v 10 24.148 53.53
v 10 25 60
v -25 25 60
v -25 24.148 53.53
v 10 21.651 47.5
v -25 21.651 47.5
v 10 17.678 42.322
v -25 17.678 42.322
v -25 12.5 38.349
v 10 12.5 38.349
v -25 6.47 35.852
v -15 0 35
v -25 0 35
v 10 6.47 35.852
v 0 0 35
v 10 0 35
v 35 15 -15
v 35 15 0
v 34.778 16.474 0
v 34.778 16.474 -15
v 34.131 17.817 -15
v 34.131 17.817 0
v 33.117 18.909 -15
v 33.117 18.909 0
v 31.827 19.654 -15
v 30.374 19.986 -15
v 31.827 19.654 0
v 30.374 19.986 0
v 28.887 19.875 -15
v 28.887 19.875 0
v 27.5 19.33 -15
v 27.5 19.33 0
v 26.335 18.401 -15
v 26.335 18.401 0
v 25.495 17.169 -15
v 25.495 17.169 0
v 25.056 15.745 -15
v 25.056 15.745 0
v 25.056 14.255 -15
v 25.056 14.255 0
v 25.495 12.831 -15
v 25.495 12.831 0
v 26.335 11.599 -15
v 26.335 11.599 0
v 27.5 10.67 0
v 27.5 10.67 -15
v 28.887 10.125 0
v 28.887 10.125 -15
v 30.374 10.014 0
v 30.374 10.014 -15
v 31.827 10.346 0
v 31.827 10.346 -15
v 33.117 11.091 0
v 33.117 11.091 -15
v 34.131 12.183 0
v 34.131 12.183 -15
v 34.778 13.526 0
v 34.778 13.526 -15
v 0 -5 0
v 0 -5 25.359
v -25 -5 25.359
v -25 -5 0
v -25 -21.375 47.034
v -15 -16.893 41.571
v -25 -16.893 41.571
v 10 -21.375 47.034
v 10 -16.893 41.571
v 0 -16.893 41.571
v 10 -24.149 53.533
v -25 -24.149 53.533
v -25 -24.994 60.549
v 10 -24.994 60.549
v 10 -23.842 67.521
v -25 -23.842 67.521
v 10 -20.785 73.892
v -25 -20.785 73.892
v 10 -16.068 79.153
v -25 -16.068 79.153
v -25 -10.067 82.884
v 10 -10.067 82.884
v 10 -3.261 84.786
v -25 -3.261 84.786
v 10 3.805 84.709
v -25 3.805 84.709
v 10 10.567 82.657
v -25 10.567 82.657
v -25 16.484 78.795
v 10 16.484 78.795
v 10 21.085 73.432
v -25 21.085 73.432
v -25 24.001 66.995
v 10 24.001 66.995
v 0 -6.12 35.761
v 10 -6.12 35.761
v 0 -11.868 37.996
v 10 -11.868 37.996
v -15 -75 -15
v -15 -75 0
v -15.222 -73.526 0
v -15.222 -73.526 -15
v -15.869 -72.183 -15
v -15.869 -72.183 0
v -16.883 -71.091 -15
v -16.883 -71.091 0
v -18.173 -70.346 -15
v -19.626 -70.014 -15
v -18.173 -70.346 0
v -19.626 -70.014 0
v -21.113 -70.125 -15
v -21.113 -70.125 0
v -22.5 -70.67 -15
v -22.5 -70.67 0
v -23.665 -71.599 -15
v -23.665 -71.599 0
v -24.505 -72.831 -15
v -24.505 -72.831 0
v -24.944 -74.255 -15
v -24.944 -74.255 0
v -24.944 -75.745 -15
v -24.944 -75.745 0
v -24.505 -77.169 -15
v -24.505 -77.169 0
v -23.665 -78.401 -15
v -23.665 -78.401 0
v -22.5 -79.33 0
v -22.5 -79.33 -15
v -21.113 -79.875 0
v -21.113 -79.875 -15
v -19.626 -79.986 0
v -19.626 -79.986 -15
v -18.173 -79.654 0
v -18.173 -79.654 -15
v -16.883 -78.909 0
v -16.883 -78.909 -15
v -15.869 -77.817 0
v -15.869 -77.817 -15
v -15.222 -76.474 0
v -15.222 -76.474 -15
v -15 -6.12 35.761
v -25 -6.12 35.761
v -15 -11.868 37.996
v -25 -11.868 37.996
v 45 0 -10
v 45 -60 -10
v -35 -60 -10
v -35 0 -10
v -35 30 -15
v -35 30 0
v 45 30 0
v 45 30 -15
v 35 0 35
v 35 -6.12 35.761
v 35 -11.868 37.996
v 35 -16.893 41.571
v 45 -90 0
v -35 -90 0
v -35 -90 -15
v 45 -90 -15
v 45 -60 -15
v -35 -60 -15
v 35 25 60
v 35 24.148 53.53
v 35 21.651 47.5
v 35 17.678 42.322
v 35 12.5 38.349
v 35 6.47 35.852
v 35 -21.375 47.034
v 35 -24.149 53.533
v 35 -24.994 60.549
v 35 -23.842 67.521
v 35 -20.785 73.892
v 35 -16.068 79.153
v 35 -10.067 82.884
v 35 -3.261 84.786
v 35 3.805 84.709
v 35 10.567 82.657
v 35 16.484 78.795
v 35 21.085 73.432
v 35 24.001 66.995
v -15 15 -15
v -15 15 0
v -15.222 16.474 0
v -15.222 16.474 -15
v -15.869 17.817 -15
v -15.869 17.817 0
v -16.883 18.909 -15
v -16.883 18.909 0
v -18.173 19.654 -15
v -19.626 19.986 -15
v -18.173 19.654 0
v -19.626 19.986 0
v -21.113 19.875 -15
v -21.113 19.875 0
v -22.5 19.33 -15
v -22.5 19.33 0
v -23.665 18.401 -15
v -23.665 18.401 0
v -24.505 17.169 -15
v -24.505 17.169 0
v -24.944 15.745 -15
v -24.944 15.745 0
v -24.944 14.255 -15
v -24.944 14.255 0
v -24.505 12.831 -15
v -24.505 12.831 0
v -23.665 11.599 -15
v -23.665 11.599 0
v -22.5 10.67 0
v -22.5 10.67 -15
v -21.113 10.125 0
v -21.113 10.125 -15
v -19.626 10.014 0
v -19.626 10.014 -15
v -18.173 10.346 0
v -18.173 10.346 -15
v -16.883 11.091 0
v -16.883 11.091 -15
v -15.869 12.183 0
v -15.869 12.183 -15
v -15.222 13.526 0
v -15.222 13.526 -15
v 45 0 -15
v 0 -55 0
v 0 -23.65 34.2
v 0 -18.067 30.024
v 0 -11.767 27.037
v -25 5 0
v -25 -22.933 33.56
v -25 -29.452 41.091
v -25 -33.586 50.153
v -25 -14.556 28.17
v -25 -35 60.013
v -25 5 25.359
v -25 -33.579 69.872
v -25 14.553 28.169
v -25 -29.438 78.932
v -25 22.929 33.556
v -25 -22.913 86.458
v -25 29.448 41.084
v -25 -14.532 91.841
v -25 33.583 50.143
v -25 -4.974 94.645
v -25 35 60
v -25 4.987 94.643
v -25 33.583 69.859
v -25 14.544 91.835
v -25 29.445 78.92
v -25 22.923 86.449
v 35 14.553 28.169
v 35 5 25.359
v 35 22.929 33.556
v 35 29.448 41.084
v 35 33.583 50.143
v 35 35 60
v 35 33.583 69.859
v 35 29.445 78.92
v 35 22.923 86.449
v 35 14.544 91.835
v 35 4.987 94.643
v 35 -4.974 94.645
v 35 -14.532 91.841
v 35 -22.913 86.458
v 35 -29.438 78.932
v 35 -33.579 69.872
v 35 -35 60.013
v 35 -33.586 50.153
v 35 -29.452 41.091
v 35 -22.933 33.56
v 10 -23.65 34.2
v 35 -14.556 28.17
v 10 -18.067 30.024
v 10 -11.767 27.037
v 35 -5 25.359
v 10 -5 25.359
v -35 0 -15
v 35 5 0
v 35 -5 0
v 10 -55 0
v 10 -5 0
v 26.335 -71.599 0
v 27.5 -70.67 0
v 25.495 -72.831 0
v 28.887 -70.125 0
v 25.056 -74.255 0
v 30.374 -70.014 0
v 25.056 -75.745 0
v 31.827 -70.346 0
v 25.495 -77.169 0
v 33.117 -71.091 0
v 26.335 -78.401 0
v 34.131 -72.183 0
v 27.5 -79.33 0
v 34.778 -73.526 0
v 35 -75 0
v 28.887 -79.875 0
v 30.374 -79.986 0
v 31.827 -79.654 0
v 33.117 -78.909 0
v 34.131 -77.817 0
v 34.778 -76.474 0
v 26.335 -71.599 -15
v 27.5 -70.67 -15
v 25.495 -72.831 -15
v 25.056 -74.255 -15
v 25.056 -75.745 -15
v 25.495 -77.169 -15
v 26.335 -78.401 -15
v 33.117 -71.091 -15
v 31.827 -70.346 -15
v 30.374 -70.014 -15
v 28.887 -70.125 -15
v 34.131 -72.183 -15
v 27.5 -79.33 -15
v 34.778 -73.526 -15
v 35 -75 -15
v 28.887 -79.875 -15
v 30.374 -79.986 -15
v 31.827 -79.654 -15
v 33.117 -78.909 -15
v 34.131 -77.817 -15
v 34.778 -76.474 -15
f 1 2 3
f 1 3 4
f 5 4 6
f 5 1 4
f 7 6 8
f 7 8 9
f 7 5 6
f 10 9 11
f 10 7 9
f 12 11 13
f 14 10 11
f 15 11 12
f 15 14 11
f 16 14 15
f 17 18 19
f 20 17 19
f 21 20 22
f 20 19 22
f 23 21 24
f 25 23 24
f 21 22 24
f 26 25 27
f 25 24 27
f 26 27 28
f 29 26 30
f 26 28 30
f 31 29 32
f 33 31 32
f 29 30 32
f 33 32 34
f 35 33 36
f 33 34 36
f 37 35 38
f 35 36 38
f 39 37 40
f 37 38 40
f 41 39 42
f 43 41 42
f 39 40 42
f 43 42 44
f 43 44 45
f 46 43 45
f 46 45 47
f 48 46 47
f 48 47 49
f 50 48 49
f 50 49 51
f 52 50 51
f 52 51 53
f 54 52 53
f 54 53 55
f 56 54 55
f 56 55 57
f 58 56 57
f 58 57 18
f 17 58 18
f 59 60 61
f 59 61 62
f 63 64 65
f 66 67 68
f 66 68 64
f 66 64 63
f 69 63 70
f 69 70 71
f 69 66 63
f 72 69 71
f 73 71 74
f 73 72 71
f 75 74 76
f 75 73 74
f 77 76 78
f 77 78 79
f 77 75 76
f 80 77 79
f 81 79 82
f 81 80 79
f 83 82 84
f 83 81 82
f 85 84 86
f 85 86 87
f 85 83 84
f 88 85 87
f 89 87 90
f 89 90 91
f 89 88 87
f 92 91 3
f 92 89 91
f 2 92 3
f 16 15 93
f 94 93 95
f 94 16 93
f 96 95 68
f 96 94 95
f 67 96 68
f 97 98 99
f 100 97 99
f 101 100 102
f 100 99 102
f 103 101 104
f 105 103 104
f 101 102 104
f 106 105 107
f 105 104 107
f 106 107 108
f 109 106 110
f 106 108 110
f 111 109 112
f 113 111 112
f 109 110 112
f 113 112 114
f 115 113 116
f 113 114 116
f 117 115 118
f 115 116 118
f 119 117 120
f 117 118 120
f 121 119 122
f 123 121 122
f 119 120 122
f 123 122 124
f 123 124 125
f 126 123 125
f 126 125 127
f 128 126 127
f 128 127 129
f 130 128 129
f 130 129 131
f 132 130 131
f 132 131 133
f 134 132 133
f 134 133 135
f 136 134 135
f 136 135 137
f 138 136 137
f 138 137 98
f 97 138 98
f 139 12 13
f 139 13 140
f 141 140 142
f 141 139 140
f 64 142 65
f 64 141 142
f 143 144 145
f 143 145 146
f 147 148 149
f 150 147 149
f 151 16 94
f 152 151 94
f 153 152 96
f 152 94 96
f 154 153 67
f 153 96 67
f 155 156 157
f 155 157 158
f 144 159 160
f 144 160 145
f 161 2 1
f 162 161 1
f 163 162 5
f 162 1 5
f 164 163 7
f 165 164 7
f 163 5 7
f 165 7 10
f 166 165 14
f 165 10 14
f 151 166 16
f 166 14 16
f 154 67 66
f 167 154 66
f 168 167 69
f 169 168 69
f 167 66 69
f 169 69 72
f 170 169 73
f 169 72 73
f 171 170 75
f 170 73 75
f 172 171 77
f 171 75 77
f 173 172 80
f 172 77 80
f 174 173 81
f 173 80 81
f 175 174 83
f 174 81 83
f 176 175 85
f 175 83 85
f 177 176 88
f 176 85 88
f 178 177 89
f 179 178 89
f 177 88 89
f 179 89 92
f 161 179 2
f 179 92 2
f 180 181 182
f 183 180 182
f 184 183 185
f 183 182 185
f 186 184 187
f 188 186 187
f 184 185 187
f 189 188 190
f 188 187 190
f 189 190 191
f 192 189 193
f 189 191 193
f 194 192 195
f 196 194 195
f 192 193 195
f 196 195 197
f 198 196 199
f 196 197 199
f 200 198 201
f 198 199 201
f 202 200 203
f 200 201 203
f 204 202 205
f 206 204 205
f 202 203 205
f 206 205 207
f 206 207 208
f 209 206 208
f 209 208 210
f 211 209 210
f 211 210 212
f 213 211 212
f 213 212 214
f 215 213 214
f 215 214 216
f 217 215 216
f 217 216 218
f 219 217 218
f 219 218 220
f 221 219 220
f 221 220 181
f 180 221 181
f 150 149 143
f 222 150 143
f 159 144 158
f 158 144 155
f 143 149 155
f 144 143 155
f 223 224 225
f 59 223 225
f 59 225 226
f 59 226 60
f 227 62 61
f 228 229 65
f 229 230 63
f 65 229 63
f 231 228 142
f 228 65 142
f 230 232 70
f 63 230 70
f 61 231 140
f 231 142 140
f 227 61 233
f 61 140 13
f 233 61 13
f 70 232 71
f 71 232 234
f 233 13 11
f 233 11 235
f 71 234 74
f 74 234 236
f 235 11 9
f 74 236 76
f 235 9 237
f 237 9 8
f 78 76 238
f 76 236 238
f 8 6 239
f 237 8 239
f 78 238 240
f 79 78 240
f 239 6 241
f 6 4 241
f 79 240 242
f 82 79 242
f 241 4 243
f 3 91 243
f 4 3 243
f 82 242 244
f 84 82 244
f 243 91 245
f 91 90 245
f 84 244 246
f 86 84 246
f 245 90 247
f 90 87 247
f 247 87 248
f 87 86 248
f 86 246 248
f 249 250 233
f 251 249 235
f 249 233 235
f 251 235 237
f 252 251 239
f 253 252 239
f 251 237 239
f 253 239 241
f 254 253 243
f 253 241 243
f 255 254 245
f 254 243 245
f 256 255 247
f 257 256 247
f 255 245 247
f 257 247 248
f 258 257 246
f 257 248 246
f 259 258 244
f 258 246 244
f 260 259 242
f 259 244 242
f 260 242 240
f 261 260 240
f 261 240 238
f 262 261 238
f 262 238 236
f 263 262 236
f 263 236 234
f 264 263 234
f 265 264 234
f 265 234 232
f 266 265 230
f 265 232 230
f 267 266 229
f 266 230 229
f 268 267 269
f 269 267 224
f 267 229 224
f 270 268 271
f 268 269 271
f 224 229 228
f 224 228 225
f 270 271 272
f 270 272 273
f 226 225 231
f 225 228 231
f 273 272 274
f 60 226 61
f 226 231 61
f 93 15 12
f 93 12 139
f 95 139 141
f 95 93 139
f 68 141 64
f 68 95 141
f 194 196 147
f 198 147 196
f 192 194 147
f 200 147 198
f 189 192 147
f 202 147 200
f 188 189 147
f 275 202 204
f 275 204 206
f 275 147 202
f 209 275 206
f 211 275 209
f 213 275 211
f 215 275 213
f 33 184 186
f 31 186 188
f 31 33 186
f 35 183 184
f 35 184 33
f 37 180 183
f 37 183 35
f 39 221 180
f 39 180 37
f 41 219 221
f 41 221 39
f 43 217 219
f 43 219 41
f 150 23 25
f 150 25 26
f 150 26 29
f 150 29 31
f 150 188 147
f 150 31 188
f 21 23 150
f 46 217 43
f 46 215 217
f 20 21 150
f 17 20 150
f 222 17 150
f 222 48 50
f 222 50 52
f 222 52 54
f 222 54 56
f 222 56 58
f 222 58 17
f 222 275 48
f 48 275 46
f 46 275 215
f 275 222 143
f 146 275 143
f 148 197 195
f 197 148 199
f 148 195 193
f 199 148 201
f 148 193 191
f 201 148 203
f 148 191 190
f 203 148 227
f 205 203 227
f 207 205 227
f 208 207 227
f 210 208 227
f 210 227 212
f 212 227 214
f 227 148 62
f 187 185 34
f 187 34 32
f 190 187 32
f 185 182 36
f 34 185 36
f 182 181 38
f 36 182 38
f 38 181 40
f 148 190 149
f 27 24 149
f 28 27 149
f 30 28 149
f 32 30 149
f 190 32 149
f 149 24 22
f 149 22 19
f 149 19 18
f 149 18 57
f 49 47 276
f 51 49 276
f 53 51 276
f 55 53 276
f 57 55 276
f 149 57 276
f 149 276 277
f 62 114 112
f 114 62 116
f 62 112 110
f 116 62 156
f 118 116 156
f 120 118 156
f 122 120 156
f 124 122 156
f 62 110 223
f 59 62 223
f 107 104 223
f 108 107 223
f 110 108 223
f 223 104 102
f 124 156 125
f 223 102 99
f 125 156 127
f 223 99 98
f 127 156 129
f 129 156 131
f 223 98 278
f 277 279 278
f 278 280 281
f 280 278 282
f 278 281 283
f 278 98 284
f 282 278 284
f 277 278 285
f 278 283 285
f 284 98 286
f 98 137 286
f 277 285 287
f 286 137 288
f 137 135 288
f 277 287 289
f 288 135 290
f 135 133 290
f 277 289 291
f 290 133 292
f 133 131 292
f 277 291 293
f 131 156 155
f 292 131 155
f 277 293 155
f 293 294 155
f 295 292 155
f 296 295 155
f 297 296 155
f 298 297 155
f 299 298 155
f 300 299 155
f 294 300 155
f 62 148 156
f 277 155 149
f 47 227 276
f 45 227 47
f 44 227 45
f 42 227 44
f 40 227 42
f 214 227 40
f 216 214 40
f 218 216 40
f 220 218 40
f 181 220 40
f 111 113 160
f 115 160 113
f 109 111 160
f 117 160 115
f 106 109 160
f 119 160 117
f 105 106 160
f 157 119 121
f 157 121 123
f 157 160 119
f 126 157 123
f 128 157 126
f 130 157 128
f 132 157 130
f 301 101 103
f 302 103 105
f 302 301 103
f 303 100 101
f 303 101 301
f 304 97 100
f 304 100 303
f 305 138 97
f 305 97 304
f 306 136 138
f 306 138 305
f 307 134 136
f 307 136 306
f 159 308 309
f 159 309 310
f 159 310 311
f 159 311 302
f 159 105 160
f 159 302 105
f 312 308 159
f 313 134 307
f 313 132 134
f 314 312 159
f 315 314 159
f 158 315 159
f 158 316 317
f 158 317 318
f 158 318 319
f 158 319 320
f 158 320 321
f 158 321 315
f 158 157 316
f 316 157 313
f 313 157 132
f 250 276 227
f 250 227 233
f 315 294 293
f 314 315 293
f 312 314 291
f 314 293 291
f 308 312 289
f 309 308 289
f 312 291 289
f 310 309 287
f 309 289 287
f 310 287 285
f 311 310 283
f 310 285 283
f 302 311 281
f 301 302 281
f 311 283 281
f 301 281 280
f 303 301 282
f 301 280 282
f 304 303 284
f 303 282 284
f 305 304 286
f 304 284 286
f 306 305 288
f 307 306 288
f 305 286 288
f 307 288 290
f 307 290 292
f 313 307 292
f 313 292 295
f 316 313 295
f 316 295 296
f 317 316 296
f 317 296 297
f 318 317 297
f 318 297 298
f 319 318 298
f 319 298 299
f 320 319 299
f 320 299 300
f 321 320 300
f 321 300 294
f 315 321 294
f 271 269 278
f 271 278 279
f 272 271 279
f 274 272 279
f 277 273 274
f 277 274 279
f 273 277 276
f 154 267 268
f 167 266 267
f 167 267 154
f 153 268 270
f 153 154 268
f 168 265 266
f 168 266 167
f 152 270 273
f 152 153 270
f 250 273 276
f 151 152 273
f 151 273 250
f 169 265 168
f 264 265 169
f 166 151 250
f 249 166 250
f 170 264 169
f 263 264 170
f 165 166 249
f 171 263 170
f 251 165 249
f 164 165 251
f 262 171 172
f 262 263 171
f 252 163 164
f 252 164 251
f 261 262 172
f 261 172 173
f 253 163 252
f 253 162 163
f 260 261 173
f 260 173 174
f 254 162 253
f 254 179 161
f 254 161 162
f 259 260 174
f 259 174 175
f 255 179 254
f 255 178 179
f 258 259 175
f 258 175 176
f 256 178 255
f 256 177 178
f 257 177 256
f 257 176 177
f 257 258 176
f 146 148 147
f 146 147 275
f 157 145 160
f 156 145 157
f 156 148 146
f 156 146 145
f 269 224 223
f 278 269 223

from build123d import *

# Parameters (mm, degrees)
F1_DEPTH      = 10
F3_DEPTH      = 25
F3_DEPTH_BACK = 35
F4_DEPTH      = 25
F5_W          = 80
F5_H          = 120
F5_W_2        = 10
F5_H_2        = 55
F6_DEPTH      = 15
F8_DEPTH      = 60
F9_W          = 60
F9_H          = 5
F10_DEPTH     = 80
F11_R         = 5
F12_DEPTH     = 51.887460053


with BuildPart() as f1:
    # F0 (on Right) → F1 (new body)
    with BuildSketch(Plane.YZ):
        Polygon((0, 0), (0, 60), (-55, 0), align=None)
    extrude(amount=F1_DEPTH)

    # F2 (on face) → F3 (join, two sides)
    with BuildSketch(Plane.YZ.offset(10)) as f3_sk:
        with BuildLine():
            ThreePointArc((0, 25), (24.7487373415, 35.2512626585), (35, 60))
            ThreePointArc((35, 60), (-14.0932134389, 92.0371867518), (-23.6503619981, 34.199605093))
            Line((-23.6503619981, 34.199605093), (-16.8931157129, 41.571146495))
            ThreePointArc((-16.8931157129, 41.571146495), (-10.0665810278, 82.8837048227), (25, 60))
            ThreePointArc((25, 60), (17.6776695297, 42.3223304703), (0, 35))
            Line((0, 35), (0, 25))
        make_face()
        with BuildLine():
            Line((-16.8931157129, 41.571146495), (-23.6503619981, 34.199605093))
            ThreePointArc((-23.6503619981, 34.199605093), (-12.688305211, 27.3808812064), (0, 25))
            Line((0, 25), (0, 35))
            ThreePointArc((0, 35), (-9.0630751507, 36.7006294331), (-16.8931157129, 41.571146495))
        make_face()
    extrude(amount=F3_DEPTH)
    extrude(f3_sk.sketch, amount=-F3_DEPTH_BACK)

    # F4 (cut): a face of the model
    f4_faces = [f1.faces().sort_by_distance(p)[0] for p in [
        (10, -5.9044146652, 44.8209197235),
    ]]
    extrude(f4_faces, amount=-F4_DEPTH, mode=Mode.SUBTRACT)

    # F5 (on face) → F6 (join)
    with BuildSketch(Plane(origin=(0, 0, 0), x_dir=(1, 0, 0), z_dir=(0, 0, -1))):
        with Locations((5, 30)):
            Rectangle(F5_W, F5_H)
        with Locations((5, 27.5)):
            Rectangle(F5_W_2, F5_H_2, mode=Mode.SUBTRACT)
        with Locations((5, 27.5)):
            Rectangle(F5_W_2, F5_H_2)
    extrude(amount=F6_DEPTH)

    # F7 (on face) → F8 (join, through all)
    with BuildSketch(Plane.YZ.offset(35)):
        with BuildLine():
            ThreePointArc((5, 25.3589838486), (0, 25), (-5, 25.3589838486))
            Line((-5, 25.3589838486), (-5, -0.8262397959))
            Line((-5, -0.8262397959), (-5, -1.0180029073))
            Line((-5, -1.0180029073), (5, -1.0180029073))
            Line((5, -1.0180029073), (5, 25.3589838486))
        make_face()
    extrude(amount=-F8_DEPTH)

    # F9 (on face) → F10 (cut)
    with BuildSketch(Plane.YZ.offset(45)):
        with Locations((-30, -12.5)):
            Rectangle(F9_W, F9_H)
    extrude(amount=-F10_DEPTH, mode=Mode.SUBTRACT)

    # F11 (on face) → F12 (cut)
    with BuildSketch(Plane.XY):
        with Locations((-20, -75)):
            Circle(F11_R)
        with Locations((30, -75)):
            Circle(F11_R)
        with Locations((30, 15)):
            Circle(F11_R)
        with Locations((-20, 15)):
            Circle(F11_R)
    extrude(amount=-F12_DEPTH, mode=Mode.SUBTRACT)


solid = f1.part
